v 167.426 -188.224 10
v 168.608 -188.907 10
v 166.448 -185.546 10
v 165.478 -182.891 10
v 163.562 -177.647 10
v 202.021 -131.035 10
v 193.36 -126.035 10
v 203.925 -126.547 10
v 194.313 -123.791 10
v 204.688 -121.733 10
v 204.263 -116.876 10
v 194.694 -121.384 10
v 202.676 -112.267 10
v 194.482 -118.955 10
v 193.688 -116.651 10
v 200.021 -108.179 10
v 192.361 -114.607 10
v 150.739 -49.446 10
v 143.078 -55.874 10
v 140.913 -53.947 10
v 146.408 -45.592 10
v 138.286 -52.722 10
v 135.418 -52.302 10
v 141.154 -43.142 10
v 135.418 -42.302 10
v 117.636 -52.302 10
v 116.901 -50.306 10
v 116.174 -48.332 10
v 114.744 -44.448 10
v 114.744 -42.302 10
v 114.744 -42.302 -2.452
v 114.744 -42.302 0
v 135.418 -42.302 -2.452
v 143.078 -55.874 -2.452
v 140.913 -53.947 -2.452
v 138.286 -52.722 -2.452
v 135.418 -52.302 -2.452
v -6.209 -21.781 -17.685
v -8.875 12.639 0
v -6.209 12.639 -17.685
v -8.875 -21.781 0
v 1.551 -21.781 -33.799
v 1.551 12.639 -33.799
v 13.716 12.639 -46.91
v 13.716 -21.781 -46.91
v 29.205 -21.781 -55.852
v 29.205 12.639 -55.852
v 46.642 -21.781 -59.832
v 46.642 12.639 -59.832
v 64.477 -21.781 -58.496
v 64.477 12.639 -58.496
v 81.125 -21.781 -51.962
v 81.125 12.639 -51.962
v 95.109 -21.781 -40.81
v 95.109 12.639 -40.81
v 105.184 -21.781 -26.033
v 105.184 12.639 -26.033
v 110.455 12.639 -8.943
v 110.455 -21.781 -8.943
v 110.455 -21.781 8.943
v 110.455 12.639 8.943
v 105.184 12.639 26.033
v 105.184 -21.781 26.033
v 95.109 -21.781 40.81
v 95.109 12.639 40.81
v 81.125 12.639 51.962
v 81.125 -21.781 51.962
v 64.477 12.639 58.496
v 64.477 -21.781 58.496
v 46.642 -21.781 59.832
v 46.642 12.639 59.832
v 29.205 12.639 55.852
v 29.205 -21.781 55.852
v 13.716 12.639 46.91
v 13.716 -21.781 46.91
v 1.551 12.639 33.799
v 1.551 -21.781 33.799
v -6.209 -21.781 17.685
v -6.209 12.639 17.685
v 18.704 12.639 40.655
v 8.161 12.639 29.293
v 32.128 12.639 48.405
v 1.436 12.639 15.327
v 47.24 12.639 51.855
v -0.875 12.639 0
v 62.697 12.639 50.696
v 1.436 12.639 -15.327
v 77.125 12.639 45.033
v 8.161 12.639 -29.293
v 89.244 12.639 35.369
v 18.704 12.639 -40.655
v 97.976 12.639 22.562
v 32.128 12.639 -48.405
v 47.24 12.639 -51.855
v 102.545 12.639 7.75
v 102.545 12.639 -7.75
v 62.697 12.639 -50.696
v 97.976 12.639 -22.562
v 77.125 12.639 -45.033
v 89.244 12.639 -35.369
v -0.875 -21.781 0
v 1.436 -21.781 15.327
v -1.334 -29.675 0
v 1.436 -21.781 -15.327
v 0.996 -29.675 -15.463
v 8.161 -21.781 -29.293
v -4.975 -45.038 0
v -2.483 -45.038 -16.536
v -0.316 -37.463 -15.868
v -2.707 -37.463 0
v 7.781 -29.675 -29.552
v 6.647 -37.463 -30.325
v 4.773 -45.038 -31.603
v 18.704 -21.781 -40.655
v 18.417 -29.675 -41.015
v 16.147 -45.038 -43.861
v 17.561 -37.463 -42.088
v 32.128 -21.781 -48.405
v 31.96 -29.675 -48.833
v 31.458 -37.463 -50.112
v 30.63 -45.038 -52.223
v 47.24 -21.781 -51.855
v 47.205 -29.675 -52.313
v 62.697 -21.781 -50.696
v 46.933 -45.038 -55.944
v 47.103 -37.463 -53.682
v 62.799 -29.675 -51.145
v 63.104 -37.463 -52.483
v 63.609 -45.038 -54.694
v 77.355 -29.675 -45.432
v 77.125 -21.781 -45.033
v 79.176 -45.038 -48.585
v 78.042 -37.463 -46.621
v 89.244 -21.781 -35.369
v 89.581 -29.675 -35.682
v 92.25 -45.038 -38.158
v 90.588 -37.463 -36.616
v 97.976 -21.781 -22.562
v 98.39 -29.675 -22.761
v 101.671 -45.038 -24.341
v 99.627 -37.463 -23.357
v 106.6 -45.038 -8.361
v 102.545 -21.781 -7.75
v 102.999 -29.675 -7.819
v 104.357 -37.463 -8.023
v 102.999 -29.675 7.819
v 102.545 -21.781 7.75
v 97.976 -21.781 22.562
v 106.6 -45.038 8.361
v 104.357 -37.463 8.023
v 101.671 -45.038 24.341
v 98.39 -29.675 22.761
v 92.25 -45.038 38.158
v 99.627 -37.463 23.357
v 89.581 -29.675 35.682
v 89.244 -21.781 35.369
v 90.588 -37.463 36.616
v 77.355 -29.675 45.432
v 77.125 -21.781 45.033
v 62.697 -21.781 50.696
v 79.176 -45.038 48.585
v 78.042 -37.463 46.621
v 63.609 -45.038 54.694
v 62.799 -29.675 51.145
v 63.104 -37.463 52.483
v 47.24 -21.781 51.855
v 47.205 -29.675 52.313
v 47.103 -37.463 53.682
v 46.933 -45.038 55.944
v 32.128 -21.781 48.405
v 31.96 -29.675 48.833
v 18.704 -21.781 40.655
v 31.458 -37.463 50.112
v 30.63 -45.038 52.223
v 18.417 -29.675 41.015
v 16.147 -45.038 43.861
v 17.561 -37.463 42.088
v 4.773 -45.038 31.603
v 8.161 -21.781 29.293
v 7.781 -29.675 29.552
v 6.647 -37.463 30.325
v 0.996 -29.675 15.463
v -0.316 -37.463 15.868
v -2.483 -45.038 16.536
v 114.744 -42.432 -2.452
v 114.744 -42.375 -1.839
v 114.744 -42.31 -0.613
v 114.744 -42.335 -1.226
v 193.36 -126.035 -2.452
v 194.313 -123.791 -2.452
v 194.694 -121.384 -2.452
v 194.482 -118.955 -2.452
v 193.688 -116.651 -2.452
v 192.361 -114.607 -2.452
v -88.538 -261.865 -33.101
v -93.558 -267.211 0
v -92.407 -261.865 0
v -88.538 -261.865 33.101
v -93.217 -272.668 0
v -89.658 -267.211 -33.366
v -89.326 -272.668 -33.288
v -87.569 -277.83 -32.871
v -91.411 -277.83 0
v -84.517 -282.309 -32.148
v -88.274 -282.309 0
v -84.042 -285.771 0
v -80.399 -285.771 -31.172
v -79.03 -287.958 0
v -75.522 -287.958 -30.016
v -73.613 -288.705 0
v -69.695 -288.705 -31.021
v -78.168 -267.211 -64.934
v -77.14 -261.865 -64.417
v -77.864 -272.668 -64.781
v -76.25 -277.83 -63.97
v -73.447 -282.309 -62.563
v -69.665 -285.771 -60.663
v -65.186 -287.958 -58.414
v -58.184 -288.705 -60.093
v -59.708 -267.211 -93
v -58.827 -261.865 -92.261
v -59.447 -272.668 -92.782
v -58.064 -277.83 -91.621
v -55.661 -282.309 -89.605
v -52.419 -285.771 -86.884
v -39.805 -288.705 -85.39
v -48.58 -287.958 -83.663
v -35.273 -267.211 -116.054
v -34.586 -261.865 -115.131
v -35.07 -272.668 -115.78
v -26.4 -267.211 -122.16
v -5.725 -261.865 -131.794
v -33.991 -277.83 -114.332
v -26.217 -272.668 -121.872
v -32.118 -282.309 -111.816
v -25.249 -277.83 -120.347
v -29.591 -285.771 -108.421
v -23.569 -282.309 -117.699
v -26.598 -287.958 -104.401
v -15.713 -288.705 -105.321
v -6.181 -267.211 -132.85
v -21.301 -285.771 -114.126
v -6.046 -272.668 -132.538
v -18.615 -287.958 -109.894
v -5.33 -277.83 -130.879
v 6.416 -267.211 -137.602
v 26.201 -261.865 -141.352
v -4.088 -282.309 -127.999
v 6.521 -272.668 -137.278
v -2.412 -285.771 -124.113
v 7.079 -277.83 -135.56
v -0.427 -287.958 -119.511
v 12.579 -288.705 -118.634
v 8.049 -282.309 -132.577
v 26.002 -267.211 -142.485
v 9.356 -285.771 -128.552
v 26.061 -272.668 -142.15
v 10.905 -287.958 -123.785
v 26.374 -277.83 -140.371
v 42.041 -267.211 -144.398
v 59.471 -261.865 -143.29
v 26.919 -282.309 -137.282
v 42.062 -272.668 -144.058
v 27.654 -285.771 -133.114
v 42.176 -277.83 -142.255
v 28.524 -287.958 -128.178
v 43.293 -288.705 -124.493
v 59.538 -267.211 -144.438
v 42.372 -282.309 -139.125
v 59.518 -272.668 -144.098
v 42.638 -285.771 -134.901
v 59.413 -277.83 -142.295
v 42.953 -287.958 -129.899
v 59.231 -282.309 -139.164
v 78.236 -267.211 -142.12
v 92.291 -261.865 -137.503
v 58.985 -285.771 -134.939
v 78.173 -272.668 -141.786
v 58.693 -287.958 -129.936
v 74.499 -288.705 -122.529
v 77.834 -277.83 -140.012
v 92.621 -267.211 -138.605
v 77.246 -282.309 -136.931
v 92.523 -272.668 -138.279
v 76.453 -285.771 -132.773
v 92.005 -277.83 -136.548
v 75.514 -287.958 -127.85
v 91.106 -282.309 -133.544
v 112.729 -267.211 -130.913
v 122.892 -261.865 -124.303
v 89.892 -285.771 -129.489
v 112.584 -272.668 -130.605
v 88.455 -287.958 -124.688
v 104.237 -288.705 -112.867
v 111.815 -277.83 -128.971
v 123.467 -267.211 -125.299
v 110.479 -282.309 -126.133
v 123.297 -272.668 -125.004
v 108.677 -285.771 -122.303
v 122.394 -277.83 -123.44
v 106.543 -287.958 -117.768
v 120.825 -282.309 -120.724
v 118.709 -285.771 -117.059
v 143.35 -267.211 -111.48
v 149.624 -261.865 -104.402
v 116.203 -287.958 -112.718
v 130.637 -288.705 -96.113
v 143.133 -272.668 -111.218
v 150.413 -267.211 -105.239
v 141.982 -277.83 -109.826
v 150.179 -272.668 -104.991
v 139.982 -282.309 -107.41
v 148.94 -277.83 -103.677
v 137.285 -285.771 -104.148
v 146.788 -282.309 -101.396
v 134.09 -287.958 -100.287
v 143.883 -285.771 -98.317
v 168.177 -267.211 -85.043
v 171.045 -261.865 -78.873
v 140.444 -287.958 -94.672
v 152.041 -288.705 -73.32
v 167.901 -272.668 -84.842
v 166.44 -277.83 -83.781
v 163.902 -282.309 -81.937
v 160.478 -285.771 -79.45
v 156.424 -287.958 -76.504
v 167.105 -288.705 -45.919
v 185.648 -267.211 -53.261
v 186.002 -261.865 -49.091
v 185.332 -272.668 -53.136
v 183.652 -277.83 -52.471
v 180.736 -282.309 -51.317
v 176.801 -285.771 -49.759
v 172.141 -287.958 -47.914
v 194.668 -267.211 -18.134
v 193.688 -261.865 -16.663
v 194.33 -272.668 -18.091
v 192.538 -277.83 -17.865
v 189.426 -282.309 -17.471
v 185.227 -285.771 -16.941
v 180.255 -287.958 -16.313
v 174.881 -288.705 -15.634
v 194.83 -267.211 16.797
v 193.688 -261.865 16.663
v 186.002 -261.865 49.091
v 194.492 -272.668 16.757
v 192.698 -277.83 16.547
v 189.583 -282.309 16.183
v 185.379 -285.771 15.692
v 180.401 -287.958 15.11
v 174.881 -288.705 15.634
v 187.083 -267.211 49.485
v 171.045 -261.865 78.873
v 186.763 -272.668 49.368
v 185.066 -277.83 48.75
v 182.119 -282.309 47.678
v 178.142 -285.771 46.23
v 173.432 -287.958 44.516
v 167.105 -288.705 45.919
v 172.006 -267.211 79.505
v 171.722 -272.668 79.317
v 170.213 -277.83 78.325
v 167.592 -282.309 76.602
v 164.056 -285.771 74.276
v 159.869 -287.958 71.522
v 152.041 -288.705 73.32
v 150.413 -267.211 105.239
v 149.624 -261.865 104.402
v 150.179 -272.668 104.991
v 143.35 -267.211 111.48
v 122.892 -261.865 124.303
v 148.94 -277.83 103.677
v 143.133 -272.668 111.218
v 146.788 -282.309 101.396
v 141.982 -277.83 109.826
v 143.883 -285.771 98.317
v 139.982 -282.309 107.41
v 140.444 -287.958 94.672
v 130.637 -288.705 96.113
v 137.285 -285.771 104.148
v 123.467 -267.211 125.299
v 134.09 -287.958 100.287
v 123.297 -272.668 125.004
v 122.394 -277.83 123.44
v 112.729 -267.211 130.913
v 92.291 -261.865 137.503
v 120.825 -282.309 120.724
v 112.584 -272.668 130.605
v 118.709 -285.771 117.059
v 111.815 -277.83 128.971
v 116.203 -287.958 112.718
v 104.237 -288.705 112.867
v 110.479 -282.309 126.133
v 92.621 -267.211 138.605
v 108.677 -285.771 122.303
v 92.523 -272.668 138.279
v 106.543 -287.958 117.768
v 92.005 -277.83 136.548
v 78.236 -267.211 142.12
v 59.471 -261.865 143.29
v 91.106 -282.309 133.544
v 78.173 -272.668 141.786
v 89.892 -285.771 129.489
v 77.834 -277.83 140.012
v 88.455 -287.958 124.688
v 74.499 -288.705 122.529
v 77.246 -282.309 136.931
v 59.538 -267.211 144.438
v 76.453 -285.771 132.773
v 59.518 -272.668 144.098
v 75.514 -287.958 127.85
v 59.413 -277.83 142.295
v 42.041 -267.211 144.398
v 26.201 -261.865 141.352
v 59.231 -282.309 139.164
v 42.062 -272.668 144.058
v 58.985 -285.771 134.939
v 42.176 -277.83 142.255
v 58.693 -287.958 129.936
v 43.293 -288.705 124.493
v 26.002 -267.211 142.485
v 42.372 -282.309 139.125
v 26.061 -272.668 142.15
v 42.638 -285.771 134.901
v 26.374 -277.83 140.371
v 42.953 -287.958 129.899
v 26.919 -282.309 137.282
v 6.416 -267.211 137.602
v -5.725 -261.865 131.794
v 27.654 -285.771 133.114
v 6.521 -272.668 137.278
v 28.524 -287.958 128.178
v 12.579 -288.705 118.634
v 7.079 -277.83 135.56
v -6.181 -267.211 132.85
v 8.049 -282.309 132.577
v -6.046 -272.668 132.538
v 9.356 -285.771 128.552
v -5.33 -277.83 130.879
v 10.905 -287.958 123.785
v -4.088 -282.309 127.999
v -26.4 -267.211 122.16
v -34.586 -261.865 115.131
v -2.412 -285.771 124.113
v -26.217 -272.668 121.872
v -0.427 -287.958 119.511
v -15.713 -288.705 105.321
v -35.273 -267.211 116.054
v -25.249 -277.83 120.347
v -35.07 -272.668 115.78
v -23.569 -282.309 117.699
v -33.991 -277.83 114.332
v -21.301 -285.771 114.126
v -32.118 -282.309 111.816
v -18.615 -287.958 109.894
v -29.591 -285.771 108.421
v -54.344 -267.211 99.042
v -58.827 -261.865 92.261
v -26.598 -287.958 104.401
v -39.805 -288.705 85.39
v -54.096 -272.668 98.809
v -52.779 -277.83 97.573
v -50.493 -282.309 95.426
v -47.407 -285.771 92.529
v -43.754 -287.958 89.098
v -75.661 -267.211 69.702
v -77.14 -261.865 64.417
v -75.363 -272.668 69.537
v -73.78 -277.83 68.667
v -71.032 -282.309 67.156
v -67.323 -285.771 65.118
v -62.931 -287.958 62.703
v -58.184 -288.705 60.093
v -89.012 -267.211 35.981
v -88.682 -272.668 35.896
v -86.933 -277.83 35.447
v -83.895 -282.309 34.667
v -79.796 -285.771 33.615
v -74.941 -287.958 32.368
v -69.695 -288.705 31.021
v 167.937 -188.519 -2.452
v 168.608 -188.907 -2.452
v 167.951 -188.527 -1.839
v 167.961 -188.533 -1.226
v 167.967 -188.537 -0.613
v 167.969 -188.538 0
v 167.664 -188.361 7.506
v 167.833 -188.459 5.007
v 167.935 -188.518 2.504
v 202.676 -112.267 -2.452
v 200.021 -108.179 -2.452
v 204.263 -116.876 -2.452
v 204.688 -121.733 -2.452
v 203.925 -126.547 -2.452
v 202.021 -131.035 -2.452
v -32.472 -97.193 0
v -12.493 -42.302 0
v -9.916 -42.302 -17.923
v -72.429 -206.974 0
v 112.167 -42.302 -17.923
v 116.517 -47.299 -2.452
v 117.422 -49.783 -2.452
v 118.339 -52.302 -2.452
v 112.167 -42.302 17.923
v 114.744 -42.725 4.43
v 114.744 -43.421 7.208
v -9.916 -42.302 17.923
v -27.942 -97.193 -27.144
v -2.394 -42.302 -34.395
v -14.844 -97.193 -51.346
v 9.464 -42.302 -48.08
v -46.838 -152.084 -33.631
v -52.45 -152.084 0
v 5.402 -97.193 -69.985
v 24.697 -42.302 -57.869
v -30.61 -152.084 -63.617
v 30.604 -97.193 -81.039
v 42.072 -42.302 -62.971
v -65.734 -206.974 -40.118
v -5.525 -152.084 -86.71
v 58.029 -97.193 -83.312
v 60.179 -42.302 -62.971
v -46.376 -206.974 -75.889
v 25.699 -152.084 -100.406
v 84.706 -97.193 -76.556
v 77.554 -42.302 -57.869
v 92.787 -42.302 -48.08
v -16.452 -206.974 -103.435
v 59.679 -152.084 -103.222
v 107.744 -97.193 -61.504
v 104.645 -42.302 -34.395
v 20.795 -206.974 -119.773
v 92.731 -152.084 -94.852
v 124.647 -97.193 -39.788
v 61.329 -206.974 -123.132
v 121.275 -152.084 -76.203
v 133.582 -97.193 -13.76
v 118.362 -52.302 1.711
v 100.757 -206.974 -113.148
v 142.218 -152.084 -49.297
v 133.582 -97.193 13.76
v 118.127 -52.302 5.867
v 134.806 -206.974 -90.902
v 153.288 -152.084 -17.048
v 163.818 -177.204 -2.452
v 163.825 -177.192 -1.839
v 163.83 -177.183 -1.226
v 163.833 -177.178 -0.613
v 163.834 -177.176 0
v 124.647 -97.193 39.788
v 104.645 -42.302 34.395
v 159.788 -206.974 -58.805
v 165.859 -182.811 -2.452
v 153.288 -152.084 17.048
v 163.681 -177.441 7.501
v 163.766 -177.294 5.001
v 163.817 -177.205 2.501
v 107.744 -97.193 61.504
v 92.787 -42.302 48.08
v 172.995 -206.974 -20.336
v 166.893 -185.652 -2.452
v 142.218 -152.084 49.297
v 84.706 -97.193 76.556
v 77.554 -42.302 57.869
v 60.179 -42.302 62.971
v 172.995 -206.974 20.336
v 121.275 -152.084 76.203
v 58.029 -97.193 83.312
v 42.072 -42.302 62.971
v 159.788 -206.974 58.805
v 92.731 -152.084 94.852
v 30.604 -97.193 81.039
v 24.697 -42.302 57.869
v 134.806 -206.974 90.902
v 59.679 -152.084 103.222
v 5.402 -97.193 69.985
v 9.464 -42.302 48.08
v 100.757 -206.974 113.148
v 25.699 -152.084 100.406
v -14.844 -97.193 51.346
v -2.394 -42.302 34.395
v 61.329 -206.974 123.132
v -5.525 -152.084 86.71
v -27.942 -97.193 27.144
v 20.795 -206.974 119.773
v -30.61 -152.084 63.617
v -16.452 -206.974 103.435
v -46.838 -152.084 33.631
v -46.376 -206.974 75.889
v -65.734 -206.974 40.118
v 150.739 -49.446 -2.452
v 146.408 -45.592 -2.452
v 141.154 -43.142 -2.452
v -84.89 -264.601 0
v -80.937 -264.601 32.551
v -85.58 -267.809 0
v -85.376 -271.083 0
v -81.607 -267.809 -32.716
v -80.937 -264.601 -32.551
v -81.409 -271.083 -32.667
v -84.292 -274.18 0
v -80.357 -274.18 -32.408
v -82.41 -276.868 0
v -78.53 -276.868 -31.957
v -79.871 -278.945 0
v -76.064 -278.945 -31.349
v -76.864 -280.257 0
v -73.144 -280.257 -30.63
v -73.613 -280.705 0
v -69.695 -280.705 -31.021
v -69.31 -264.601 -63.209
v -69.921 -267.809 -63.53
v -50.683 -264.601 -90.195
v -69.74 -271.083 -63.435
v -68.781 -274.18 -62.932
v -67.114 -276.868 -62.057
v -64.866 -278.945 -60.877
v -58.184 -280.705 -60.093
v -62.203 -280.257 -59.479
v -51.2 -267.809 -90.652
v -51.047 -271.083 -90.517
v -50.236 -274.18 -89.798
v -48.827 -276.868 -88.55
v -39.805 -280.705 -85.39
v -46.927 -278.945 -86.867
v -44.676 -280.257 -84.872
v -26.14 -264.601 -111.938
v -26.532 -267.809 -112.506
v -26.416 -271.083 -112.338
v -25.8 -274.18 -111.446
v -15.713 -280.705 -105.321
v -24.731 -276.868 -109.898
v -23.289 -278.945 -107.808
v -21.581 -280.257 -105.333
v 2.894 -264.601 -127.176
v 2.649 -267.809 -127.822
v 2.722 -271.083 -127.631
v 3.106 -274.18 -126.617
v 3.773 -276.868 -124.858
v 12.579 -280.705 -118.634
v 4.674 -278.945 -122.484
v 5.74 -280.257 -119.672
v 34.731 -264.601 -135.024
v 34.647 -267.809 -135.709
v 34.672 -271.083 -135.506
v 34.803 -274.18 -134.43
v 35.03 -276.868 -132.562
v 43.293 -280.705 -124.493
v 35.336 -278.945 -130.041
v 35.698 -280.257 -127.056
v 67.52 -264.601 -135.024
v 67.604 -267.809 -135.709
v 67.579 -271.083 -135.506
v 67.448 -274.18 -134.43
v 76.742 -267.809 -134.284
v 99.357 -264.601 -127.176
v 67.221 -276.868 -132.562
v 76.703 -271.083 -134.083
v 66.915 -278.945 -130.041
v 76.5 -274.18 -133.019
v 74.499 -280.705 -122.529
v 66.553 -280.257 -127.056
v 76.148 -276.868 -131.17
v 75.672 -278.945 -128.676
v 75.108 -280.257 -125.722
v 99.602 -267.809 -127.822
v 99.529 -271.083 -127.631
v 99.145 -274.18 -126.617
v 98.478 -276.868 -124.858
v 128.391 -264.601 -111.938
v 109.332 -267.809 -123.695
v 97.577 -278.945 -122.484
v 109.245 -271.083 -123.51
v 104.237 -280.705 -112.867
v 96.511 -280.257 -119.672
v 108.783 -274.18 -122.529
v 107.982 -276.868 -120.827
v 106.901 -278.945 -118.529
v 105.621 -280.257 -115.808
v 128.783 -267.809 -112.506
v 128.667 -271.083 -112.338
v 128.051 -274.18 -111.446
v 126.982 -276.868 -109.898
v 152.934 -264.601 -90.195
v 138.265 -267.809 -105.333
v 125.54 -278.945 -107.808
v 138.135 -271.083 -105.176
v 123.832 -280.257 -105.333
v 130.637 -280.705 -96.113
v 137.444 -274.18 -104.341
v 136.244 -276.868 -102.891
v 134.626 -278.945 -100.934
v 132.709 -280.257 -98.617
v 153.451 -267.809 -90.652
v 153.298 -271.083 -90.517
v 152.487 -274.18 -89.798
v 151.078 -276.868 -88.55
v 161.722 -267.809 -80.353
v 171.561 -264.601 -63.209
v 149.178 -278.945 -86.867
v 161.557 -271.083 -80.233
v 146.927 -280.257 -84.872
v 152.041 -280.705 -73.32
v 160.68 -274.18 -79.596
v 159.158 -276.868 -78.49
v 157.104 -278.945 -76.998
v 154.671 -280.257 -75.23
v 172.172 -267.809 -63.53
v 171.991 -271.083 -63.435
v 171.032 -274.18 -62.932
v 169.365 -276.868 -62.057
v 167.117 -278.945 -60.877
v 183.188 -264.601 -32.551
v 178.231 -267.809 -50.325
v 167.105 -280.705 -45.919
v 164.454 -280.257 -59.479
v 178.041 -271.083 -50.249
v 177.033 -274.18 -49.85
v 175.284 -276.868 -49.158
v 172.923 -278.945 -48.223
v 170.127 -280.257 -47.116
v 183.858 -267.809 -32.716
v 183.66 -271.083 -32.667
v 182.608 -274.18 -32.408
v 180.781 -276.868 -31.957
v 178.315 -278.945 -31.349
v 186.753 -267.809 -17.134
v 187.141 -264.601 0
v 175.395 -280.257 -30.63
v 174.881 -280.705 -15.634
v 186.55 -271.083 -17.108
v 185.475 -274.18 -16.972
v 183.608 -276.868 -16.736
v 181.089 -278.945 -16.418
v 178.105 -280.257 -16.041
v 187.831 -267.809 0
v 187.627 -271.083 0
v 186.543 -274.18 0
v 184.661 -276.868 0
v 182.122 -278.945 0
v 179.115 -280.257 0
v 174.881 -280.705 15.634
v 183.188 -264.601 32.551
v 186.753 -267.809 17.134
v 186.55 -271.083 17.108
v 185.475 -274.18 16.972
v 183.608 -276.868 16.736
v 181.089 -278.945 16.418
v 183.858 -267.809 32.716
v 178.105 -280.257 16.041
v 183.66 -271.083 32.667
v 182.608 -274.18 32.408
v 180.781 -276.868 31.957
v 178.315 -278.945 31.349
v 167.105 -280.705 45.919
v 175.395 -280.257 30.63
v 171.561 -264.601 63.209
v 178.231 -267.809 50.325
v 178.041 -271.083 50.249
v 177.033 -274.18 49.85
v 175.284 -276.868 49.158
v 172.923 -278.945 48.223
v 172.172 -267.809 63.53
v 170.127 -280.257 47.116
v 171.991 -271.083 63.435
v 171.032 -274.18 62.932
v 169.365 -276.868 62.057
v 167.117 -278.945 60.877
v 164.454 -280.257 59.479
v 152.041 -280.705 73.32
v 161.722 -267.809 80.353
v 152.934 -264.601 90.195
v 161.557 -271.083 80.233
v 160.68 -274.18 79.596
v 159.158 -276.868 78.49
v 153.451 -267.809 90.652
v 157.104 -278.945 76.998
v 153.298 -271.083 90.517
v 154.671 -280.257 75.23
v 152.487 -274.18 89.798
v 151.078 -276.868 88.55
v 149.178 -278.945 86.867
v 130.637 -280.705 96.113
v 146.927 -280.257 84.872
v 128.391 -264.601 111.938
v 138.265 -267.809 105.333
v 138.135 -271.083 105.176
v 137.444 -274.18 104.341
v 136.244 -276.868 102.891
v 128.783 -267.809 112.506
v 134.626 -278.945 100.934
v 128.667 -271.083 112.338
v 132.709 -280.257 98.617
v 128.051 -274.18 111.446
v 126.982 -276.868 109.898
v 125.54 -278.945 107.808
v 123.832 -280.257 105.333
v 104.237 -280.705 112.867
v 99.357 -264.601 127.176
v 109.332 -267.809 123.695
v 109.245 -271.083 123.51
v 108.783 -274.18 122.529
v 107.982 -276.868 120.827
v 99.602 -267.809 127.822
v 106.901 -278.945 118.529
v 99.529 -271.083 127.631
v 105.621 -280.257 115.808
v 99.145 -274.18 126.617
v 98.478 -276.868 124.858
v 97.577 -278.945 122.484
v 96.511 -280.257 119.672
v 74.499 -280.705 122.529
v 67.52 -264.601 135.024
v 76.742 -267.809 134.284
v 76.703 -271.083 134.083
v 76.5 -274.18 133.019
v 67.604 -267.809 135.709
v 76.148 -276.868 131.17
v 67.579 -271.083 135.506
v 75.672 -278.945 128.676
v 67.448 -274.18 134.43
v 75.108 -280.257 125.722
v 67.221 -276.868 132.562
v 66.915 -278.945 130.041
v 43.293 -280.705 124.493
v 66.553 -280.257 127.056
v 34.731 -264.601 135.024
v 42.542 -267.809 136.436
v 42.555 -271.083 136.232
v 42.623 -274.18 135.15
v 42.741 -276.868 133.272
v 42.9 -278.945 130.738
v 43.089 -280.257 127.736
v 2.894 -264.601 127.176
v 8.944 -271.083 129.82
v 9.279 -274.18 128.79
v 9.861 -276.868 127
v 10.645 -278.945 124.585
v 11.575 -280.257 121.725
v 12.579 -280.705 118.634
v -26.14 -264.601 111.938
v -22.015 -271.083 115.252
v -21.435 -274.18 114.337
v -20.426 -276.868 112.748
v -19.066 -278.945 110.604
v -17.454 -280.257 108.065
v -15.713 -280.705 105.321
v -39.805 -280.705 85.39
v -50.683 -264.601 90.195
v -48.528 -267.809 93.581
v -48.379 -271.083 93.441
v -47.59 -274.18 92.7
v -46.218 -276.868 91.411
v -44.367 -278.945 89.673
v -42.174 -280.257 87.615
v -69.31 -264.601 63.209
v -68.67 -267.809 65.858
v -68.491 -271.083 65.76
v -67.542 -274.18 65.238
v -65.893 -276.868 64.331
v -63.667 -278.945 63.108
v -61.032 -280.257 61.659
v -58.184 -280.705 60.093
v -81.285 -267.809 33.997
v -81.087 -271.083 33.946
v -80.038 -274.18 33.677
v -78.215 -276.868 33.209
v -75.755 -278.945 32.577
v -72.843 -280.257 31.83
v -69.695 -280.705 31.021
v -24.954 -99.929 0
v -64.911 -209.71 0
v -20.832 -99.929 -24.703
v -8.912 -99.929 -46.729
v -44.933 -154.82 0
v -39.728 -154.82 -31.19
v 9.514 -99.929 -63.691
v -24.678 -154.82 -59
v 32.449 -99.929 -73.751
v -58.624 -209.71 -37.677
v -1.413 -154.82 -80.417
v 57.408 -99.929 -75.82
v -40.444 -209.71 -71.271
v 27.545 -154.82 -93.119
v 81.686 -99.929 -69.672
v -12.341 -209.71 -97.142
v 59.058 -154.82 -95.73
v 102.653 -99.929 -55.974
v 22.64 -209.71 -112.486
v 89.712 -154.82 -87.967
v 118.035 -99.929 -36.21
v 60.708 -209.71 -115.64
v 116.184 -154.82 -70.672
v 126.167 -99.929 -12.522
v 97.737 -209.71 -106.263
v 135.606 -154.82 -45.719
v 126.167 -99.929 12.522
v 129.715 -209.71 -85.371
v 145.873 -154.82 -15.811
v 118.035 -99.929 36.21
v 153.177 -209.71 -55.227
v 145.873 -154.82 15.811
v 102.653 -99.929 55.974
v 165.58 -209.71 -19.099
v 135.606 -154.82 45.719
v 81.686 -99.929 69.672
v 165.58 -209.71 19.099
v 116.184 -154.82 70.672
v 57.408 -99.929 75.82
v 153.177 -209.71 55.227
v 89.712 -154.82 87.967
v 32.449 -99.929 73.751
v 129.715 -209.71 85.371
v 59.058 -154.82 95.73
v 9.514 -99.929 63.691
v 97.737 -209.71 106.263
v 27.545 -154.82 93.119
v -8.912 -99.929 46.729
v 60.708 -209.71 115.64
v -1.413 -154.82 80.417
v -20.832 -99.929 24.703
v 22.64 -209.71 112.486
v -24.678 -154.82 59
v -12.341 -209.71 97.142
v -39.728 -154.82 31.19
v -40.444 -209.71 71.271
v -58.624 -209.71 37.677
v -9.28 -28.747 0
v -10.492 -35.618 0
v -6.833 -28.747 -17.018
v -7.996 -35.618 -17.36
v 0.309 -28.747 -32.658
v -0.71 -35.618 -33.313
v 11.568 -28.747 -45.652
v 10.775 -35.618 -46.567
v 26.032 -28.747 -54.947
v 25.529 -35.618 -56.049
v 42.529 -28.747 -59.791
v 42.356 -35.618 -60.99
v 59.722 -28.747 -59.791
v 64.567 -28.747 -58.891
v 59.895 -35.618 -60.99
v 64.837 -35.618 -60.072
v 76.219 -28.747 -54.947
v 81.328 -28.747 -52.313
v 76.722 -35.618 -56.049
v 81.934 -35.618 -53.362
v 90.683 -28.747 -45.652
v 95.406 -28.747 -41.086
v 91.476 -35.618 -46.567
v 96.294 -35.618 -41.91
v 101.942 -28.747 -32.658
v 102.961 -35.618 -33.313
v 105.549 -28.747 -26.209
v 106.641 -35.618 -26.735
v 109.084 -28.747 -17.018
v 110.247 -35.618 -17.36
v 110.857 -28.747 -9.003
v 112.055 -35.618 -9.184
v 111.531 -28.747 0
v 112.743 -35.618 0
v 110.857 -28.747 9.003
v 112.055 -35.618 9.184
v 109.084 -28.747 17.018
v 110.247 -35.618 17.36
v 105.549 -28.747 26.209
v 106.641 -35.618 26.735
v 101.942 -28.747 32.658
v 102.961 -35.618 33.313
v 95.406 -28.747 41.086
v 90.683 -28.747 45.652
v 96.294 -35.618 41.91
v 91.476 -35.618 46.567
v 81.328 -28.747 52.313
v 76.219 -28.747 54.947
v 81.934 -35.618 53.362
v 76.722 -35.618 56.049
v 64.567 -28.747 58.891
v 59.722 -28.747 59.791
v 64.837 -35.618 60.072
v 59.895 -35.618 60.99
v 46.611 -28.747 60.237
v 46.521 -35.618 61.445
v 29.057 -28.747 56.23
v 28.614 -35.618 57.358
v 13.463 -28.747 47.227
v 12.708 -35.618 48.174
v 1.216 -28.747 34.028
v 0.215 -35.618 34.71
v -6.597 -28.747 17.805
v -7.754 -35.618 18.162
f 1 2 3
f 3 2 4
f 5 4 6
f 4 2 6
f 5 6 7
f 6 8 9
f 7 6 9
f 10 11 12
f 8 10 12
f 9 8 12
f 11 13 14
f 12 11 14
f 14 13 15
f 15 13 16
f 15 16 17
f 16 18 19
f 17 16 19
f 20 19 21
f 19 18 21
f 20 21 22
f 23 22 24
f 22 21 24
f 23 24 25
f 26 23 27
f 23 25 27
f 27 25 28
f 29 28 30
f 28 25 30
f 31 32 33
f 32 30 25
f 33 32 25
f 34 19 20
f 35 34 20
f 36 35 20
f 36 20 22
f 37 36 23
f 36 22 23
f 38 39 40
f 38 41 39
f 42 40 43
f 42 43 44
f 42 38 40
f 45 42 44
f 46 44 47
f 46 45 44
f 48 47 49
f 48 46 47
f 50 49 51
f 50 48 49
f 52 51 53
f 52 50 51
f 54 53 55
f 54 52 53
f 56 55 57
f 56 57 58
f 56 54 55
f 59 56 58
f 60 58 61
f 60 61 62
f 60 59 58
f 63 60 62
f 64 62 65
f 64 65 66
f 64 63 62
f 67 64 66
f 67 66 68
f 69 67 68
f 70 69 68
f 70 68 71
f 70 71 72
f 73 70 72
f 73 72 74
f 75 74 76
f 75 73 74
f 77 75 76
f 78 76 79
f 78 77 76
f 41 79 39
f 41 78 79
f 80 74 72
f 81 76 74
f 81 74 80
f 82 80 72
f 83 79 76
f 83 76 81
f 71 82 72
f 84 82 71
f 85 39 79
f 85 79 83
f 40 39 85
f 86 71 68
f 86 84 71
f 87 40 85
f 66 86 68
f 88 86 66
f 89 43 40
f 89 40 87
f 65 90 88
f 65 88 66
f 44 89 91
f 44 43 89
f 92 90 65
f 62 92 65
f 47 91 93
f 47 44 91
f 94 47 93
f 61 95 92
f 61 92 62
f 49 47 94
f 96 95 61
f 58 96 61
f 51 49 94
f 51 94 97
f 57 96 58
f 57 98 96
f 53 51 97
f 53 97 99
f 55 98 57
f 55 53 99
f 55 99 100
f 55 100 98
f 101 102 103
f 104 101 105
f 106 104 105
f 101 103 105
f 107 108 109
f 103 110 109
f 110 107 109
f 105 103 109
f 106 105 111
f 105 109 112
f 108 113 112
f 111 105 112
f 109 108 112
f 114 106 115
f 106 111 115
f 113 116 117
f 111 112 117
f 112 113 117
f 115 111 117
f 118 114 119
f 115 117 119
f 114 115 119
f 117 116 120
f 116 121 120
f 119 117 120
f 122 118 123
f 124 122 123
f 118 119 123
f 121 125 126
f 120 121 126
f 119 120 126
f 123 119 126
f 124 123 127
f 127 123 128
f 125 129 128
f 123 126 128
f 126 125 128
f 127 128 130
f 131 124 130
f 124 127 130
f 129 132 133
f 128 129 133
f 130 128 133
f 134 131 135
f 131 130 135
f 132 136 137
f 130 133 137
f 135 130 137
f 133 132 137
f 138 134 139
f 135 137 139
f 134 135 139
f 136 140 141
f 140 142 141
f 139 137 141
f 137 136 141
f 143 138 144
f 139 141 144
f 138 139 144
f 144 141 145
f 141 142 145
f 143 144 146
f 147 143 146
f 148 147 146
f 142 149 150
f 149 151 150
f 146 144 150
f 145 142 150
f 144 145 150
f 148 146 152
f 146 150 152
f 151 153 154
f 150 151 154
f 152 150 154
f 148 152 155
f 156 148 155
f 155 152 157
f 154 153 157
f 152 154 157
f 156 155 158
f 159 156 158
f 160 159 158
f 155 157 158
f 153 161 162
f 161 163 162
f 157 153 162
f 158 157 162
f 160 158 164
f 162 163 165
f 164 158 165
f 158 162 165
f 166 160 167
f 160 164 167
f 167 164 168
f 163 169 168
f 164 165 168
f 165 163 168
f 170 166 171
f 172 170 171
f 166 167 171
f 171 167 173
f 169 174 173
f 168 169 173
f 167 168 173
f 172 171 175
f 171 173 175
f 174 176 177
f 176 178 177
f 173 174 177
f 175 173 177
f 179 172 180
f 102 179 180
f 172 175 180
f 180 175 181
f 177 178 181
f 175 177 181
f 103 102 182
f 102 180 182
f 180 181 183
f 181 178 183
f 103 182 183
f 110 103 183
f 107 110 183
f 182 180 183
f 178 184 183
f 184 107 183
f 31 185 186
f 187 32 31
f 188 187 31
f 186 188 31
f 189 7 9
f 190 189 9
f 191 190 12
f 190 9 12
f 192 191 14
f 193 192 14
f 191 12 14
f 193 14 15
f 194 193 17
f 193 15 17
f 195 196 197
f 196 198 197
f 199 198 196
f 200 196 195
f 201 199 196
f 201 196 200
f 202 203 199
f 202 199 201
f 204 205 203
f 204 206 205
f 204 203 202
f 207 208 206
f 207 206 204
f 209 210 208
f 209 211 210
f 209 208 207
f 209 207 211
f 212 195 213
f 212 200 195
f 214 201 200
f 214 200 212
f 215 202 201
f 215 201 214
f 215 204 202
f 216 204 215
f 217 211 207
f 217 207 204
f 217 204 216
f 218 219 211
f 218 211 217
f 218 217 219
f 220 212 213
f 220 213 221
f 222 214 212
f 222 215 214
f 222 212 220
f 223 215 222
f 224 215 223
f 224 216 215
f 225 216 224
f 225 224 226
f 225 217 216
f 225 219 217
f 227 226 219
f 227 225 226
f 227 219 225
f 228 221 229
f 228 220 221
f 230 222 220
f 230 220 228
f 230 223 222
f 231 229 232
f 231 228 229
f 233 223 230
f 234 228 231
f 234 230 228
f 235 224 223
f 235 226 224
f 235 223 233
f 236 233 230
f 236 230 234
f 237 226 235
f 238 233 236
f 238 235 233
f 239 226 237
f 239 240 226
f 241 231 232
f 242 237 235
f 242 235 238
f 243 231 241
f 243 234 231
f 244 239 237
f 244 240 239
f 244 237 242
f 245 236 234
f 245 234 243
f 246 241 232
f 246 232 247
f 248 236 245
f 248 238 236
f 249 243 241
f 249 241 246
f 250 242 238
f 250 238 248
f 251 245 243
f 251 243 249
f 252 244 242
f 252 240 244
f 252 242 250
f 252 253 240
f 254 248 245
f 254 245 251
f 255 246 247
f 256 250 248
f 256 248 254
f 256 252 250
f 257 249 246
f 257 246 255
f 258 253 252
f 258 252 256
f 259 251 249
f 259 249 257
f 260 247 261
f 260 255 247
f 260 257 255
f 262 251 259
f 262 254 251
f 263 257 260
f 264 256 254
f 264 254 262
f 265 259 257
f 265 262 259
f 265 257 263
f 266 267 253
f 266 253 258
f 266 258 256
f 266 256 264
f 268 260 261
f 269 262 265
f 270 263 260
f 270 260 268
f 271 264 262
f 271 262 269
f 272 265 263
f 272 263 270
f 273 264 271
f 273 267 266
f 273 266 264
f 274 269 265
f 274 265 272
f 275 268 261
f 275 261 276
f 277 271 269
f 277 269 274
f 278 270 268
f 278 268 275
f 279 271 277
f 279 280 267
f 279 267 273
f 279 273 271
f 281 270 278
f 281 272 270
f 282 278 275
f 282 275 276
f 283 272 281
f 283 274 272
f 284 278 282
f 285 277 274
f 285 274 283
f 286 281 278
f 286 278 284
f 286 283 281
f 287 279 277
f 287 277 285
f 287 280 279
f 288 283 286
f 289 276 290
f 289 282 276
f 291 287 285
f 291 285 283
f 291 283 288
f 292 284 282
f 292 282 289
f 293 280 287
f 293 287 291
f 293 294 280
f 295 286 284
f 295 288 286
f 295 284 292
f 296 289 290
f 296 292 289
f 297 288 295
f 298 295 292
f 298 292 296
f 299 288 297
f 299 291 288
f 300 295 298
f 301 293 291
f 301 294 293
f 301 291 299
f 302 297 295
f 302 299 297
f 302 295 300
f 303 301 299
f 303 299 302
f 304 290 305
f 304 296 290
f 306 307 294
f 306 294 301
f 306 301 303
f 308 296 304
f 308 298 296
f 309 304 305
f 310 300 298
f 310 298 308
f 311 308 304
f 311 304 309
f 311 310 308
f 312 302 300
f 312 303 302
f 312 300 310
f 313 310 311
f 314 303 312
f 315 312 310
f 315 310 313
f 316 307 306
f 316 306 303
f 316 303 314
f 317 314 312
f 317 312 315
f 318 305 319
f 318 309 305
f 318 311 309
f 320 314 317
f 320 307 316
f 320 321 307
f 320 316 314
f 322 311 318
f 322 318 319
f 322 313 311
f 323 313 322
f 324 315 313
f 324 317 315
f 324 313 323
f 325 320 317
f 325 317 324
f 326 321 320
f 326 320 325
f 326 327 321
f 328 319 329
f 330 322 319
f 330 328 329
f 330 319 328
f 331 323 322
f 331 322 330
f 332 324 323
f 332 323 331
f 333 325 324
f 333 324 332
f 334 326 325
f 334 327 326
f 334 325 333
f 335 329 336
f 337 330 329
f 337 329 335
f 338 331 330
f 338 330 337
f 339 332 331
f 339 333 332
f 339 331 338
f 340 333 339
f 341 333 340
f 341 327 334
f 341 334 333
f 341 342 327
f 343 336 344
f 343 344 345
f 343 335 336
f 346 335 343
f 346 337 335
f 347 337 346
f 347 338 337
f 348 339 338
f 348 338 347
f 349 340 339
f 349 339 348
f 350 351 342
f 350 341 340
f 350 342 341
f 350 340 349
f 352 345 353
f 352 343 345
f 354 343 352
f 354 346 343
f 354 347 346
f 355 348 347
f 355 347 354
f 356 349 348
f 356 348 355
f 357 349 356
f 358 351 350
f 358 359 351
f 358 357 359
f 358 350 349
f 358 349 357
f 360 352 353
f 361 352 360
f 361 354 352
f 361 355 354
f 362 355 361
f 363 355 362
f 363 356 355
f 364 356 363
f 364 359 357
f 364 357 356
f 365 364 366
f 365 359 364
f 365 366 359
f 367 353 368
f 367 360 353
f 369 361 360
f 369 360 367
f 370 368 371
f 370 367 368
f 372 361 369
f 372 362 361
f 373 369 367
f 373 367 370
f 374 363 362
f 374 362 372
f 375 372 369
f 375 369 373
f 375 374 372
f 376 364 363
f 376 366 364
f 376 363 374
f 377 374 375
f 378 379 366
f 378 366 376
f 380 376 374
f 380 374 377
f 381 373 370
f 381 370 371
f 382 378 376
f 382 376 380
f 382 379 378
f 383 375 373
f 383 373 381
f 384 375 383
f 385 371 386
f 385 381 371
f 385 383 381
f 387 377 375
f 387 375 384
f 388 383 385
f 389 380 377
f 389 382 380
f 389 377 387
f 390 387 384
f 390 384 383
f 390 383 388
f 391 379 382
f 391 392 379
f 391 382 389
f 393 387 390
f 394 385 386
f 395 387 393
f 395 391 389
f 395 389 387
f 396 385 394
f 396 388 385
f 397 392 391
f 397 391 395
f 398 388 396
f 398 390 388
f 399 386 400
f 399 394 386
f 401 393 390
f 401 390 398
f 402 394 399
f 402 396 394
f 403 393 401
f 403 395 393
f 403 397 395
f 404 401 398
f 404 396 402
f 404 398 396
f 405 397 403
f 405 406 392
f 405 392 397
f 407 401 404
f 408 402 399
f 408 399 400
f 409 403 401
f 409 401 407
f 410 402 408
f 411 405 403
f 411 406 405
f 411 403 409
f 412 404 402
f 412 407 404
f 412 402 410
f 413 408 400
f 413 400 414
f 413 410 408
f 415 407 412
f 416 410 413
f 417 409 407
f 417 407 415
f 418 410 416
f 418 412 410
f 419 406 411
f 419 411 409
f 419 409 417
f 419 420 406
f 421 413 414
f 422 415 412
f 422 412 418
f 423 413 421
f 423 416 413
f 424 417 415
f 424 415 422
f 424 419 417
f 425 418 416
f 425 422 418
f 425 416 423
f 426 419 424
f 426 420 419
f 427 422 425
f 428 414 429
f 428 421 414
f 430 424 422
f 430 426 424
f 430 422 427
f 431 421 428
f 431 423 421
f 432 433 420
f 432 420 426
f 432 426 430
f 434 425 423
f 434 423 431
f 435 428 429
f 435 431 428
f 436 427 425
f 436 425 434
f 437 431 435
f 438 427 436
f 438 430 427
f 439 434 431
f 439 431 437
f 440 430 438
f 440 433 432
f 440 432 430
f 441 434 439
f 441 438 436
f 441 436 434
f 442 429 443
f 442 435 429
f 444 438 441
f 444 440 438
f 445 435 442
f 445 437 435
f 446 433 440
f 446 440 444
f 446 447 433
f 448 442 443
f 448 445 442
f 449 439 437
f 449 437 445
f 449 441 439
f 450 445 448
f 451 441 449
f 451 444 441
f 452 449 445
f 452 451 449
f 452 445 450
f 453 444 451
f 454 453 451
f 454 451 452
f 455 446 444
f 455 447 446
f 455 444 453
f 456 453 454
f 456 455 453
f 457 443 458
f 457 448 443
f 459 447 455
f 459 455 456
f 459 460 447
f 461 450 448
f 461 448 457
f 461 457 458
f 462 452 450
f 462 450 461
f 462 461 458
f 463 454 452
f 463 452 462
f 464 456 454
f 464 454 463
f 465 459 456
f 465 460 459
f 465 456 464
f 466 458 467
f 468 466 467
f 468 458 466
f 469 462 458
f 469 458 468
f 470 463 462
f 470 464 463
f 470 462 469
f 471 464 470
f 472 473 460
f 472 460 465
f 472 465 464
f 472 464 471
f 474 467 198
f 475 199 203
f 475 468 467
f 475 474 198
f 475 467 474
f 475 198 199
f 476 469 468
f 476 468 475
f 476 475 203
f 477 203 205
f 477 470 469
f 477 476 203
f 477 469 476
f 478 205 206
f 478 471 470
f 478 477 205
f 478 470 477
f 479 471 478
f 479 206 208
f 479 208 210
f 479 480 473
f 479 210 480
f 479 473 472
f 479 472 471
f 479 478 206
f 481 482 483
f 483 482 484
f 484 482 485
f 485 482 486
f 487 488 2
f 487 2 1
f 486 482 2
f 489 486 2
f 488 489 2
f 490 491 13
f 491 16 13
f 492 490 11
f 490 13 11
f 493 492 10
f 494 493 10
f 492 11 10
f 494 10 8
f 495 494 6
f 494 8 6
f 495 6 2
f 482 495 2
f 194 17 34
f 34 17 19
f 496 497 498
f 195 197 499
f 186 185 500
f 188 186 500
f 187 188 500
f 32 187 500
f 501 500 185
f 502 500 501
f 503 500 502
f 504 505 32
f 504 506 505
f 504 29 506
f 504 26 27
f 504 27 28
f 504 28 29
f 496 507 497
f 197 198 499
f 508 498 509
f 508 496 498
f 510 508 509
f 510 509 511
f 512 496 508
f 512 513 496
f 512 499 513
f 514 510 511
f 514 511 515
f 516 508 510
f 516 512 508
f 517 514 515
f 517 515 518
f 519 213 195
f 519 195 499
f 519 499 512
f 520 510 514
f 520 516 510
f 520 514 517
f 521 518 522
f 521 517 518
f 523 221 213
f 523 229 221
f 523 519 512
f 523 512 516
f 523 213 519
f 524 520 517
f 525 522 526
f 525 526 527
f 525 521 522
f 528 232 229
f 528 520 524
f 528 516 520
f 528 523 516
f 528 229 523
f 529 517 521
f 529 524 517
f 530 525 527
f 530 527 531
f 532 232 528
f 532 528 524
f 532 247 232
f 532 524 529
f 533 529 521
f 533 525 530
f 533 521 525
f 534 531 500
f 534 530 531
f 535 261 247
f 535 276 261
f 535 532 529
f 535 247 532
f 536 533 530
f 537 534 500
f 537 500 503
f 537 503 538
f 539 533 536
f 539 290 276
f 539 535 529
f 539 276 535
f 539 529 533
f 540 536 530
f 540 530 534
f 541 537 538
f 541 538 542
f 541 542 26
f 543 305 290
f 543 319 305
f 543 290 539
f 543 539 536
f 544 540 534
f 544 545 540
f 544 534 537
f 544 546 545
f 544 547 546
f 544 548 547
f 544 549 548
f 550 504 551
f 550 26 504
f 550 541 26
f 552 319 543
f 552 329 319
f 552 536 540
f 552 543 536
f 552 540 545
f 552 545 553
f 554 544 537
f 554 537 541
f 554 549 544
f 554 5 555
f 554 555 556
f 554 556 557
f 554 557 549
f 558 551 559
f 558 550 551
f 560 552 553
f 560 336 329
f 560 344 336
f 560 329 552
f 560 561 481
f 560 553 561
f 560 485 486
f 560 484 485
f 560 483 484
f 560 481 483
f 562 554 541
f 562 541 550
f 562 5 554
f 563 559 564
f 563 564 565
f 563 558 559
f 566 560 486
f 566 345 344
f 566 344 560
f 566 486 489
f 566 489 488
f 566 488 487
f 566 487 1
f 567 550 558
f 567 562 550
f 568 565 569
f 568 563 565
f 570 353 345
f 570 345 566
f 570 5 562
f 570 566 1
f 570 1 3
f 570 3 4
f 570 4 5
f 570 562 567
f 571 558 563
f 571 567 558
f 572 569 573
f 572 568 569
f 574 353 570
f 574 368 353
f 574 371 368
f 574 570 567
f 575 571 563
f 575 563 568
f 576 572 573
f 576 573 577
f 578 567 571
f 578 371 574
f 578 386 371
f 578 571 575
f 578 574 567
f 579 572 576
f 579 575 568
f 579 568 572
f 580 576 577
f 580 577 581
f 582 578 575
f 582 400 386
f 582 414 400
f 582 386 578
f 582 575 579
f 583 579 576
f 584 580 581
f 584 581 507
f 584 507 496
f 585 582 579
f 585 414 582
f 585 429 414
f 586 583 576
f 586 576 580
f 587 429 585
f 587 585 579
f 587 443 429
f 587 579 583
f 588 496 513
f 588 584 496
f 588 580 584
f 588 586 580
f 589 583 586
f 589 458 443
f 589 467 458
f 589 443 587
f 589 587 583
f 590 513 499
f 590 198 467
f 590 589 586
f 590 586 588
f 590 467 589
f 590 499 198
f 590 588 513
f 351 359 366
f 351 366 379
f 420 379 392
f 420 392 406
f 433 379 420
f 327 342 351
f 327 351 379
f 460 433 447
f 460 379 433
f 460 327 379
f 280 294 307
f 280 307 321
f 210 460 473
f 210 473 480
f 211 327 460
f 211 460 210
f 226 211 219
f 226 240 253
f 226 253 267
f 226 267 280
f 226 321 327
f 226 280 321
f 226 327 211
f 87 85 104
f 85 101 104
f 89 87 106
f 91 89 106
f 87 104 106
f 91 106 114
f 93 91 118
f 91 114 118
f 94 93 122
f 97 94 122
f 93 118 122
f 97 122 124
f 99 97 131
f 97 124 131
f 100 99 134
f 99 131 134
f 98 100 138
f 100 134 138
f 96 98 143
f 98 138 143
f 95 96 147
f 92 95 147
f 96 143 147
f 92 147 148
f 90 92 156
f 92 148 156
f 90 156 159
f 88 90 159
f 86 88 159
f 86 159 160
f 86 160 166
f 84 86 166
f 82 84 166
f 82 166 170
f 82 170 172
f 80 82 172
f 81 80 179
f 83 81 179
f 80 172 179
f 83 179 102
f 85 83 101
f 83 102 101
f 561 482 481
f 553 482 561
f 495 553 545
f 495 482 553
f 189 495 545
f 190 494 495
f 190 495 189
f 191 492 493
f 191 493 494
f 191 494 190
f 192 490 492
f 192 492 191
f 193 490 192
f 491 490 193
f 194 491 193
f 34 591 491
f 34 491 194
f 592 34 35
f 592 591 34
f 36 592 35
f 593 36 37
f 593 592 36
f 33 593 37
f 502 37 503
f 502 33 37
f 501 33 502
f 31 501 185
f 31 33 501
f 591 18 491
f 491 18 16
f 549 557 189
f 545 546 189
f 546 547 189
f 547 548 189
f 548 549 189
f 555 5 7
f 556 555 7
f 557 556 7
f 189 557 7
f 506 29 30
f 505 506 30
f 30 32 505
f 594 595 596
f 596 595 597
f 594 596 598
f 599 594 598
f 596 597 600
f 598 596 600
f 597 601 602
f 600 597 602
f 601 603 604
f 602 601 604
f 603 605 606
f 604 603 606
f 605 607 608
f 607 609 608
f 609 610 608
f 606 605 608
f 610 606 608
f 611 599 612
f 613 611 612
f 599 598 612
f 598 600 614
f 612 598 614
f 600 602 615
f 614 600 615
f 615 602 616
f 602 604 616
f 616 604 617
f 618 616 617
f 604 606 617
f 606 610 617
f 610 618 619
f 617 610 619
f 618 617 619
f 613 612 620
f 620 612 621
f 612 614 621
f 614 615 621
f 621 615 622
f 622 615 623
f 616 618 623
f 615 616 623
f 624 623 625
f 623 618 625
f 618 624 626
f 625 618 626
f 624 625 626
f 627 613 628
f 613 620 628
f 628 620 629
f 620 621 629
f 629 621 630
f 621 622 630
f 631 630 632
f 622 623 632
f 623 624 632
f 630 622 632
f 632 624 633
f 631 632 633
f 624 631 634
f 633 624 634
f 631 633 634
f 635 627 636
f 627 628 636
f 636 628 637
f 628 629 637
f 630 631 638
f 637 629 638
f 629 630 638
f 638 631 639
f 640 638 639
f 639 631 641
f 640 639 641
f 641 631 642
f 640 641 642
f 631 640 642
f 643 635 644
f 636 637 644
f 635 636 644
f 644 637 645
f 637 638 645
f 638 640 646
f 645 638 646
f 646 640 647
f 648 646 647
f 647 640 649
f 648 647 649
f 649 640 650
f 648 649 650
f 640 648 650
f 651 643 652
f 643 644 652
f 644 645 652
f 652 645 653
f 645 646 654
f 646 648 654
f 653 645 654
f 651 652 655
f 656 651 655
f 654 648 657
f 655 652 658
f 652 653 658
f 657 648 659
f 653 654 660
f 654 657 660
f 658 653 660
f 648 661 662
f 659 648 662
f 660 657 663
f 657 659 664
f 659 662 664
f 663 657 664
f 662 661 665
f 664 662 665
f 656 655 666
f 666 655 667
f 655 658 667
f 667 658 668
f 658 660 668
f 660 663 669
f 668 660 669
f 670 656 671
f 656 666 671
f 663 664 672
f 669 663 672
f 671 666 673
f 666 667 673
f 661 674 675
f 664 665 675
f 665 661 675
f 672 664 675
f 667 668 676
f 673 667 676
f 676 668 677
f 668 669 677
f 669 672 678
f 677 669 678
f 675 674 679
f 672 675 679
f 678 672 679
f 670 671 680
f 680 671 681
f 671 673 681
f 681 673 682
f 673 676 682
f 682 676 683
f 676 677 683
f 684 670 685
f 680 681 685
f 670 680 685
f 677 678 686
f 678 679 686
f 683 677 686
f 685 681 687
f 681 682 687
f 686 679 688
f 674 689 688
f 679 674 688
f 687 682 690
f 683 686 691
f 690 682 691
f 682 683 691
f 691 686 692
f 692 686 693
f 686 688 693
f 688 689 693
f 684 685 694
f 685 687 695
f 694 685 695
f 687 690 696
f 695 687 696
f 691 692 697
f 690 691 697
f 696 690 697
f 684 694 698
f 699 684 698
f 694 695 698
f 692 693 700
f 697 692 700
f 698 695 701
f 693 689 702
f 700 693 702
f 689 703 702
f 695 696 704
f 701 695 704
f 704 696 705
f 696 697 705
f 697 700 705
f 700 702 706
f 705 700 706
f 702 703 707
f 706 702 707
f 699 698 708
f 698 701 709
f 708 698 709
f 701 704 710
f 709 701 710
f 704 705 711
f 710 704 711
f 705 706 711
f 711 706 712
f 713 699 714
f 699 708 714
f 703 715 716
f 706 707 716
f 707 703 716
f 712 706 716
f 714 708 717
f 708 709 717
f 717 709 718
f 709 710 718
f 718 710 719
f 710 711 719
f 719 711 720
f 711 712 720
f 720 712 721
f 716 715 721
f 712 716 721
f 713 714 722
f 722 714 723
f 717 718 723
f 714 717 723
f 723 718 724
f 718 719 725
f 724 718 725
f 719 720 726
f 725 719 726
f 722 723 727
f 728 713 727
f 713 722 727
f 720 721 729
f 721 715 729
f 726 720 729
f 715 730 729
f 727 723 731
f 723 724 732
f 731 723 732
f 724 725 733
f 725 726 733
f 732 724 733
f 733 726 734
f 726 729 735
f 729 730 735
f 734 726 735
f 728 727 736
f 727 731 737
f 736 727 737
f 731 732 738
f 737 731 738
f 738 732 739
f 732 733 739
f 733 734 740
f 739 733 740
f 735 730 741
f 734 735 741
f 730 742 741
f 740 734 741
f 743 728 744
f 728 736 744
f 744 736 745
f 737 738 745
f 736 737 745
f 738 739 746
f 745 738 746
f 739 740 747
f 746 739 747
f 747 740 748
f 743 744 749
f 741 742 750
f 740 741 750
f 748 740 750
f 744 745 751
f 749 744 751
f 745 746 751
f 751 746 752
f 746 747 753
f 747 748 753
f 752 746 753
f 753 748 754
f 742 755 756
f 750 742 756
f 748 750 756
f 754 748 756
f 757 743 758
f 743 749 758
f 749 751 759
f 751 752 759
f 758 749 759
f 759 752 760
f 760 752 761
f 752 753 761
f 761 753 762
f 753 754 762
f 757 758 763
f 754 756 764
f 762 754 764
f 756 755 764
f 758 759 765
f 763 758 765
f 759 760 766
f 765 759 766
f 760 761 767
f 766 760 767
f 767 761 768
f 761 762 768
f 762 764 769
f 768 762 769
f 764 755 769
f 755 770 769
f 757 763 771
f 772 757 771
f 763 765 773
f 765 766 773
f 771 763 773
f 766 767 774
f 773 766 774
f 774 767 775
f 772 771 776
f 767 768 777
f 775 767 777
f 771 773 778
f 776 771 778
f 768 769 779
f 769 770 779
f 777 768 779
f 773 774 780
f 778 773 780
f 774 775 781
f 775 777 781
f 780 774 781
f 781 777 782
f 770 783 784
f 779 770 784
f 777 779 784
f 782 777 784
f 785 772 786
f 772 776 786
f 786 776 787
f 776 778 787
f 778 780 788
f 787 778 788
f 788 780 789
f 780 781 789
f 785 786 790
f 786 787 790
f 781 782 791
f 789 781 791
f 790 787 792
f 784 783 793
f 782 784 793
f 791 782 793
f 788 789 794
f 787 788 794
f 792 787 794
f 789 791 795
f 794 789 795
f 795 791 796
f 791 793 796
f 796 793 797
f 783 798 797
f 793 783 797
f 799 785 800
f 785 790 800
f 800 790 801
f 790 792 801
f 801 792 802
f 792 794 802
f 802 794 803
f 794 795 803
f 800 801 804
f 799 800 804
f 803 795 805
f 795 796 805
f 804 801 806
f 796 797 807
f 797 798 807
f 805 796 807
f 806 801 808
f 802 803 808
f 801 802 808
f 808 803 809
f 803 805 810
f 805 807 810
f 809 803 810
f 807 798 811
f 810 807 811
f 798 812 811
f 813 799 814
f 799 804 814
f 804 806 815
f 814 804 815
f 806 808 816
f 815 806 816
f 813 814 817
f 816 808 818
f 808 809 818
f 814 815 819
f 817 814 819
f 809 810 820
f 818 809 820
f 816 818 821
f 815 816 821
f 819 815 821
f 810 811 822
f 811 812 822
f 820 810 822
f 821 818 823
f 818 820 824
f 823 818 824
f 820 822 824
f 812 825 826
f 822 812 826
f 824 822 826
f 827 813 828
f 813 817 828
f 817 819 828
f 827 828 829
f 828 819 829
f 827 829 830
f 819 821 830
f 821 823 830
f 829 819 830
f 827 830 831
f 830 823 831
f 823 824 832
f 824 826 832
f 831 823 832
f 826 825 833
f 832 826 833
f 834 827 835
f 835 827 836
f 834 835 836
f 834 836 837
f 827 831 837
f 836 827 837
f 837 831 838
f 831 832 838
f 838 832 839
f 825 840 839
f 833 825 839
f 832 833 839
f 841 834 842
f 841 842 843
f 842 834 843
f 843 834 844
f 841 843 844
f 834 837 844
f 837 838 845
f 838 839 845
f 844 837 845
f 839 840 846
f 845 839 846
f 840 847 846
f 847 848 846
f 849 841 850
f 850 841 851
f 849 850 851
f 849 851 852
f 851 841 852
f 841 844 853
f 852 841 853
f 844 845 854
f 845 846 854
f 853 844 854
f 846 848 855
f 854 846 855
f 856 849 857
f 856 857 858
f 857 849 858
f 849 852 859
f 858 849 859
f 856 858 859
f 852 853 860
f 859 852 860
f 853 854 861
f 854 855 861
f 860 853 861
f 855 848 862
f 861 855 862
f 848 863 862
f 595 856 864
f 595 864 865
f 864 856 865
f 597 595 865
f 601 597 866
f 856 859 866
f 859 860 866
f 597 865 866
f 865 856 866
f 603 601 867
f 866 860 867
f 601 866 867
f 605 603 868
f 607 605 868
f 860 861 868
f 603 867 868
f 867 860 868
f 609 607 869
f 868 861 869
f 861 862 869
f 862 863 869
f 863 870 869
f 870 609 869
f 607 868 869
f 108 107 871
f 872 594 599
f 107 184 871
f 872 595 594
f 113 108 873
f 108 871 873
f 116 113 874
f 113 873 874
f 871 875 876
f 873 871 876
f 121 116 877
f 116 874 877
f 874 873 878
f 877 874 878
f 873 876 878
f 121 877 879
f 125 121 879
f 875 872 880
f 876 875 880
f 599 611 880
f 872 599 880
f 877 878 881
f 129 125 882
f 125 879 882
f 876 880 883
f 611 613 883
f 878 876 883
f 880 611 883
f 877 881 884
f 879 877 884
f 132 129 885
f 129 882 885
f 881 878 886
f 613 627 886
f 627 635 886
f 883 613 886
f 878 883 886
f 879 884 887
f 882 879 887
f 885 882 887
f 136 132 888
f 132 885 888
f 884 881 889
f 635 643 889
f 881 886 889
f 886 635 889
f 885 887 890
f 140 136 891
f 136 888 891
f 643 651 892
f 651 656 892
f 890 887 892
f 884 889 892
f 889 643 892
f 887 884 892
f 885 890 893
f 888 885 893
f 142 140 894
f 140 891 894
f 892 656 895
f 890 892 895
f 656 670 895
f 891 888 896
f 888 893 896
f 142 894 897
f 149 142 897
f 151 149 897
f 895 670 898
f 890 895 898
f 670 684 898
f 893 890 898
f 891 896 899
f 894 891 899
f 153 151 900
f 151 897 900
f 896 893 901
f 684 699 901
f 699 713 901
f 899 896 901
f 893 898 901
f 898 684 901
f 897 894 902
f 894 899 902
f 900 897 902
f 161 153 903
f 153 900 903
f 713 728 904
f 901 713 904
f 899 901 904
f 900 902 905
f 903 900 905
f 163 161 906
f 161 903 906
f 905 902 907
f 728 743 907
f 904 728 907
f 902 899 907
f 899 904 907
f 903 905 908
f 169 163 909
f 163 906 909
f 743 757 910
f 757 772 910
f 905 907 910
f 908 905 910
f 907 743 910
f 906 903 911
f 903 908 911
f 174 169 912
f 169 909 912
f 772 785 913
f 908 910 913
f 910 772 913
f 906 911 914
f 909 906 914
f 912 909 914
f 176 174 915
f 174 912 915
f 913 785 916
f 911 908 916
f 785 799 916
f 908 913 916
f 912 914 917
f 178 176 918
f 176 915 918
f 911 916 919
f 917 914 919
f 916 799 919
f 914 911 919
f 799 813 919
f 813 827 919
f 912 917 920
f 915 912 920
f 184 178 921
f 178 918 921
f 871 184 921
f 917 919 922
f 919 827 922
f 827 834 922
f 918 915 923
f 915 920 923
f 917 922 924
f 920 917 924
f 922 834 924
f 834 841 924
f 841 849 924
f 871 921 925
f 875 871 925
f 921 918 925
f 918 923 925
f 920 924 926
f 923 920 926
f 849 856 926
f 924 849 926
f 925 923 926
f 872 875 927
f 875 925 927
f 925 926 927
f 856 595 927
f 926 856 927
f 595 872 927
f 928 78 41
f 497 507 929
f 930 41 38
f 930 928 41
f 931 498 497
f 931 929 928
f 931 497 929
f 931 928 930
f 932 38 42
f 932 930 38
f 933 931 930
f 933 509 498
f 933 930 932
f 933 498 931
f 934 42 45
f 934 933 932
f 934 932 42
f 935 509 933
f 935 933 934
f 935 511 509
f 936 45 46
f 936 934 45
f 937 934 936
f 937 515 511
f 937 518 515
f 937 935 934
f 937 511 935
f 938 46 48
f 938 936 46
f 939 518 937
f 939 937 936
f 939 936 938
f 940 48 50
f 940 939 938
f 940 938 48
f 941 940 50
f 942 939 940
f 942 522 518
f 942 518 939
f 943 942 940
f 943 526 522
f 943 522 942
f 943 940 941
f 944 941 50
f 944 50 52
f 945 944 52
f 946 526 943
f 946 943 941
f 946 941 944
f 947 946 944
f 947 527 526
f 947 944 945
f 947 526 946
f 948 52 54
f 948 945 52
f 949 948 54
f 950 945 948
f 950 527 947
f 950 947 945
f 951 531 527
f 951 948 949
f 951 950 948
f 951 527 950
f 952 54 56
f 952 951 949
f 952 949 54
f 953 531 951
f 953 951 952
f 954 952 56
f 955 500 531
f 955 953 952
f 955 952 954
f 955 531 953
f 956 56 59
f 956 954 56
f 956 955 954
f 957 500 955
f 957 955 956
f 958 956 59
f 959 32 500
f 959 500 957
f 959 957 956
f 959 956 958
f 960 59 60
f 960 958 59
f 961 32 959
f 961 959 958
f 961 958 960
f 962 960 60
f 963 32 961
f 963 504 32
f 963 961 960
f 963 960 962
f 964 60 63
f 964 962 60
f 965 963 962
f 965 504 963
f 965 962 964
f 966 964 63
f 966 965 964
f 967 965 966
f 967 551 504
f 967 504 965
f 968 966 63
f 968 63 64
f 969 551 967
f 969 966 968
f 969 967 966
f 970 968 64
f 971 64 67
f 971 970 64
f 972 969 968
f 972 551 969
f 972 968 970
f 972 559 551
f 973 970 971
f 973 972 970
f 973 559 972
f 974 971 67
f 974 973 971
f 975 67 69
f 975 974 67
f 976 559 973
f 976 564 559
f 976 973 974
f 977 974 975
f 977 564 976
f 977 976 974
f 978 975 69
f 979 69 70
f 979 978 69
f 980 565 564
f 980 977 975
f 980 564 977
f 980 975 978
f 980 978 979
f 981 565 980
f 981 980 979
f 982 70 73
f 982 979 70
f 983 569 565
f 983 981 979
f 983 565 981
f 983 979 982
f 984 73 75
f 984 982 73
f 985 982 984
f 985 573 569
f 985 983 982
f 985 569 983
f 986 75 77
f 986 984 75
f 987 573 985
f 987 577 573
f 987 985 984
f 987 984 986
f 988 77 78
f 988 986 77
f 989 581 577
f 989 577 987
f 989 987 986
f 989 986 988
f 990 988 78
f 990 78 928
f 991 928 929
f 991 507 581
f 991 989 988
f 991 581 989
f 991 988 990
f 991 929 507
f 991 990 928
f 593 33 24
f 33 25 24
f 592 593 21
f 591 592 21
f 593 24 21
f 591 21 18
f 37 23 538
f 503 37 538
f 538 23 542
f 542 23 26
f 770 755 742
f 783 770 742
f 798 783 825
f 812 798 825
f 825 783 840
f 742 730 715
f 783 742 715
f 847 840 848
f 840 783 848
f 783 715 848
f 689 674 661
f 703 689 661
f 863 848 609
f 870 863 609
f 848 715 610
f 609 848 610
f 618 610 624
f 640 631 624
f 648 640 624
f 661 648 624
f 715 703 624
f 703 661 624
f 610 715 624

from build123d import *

# Parameters (mm, degrees)
SHELL1_T                 = -8
FILLET1_R                = 12
FILLET3_R                = 20
EXTRUDE_THIN1_DEPTH      = 10
EXTRUDE_THIN1_DEPTH_BACK = 2.451833806


with BuildPart() as part:
    # Sketch2 → Revolve2 (revolve)
    with BuildSketch(Plane.XY):
        with BuildLine():
            Line((-8.874501992, 12.639442231), (-8.874501992, -21.780938926))
            ThreePointArc((-8.874501992, -21.780938926), (-9.786036811, -32.199829586), (-12.492944745, -42.302147526))
            Line((-12.492944745, -42.302147526), (-102.176418507, -288.705466585))
            Line((-102.176418507, -288.705466585), (51.125498008, -288.705466585))
            Line((51.125498008, -288.705466585), (51.125498008, 12.639442231))
            Line((51.125498008, 12.639442231), (-8.874501992, 12.639442231))
        make_face()
    revolve(axis=Axis((51.125498008, 12.639442231, 0), (0, -1, 0)))

    # Shell1
    shell1_openings = [part.faces().sort_by_distance(p)[0] for p in [
        (51.125498008, 12.639442231, 0),
    ]]
    offset(amount=SHELL1_T, openings=shell1_openings, kind=Kind.INTERSECTION)

    # Fillet1
    fillet1_edges = [part.edges().sort_by_distance(p)[0] for p in [
        (193.002230469, -280.705466585, 0),
    ]]
    fillet(fillet1_edges, radius=FILLET1_R)

    # Fillet3
    fillet3_edges = [part.edges().sort_by_distance(p)[0] for p in [
        (204.427414523, -288.705466585, 0),
    ]]
    fillet(fillet3_edges, radius=FILLET3_R)

    # Sketch3 → Extrude-Thin1 (add, two sides)
    with BuildSketch(Plane.XY) as extrude_thin1_sk:
        with BuildLine():
            Line((114.743940761, -42.302147526), (135.417787598, -42.302147526))
            ThreePointArc((135.417787598, -42.302147526), (143.870152833, -44.175991785), (150.73867646, -49.446395332))
            Line((150.73867646, -49.446395332), (200.021007134, -108.178789964))
            ThreePointArc((200.021007134, -108.178789964), (204.624012234, -119.291427303), (202.020626347, -131.034542158))
            Line((202.020626347, -131.034542158), (168.608182886, -188.906591838))
            Line((168.608182886, -188.906591838), (159.947928848, -183.906591838))
            Line((159.947928848, -183.906591838), (193.36037231, -126.034542158))
            ThreePointArc((193.36037231, -126.034542158), (194.662065253, -120.162984731), (192.360562703, -114.606666061))
            Line((192.360562703, -114.606666061), (143.078232029, -55.874271429))
            ThreePointArc((143.078232029, -55.874271429), (139.643970215, -53.239069656), (135.417787598, -52.302147526))
            Line((135.417787598, -52.302147526), (114.743940761, -52.302147526))
            Line((114.743940761, -52.302147526), (114.743940761, -42.302147526))
        make_face()
    extrude(amount=EXTRUDE_THIN1_DEPTH)
    extrude(extrude_thin1_sk.sketch, amount=-EXTRUDE_THIN1_DEPTH_BACK)


solid = part.part
